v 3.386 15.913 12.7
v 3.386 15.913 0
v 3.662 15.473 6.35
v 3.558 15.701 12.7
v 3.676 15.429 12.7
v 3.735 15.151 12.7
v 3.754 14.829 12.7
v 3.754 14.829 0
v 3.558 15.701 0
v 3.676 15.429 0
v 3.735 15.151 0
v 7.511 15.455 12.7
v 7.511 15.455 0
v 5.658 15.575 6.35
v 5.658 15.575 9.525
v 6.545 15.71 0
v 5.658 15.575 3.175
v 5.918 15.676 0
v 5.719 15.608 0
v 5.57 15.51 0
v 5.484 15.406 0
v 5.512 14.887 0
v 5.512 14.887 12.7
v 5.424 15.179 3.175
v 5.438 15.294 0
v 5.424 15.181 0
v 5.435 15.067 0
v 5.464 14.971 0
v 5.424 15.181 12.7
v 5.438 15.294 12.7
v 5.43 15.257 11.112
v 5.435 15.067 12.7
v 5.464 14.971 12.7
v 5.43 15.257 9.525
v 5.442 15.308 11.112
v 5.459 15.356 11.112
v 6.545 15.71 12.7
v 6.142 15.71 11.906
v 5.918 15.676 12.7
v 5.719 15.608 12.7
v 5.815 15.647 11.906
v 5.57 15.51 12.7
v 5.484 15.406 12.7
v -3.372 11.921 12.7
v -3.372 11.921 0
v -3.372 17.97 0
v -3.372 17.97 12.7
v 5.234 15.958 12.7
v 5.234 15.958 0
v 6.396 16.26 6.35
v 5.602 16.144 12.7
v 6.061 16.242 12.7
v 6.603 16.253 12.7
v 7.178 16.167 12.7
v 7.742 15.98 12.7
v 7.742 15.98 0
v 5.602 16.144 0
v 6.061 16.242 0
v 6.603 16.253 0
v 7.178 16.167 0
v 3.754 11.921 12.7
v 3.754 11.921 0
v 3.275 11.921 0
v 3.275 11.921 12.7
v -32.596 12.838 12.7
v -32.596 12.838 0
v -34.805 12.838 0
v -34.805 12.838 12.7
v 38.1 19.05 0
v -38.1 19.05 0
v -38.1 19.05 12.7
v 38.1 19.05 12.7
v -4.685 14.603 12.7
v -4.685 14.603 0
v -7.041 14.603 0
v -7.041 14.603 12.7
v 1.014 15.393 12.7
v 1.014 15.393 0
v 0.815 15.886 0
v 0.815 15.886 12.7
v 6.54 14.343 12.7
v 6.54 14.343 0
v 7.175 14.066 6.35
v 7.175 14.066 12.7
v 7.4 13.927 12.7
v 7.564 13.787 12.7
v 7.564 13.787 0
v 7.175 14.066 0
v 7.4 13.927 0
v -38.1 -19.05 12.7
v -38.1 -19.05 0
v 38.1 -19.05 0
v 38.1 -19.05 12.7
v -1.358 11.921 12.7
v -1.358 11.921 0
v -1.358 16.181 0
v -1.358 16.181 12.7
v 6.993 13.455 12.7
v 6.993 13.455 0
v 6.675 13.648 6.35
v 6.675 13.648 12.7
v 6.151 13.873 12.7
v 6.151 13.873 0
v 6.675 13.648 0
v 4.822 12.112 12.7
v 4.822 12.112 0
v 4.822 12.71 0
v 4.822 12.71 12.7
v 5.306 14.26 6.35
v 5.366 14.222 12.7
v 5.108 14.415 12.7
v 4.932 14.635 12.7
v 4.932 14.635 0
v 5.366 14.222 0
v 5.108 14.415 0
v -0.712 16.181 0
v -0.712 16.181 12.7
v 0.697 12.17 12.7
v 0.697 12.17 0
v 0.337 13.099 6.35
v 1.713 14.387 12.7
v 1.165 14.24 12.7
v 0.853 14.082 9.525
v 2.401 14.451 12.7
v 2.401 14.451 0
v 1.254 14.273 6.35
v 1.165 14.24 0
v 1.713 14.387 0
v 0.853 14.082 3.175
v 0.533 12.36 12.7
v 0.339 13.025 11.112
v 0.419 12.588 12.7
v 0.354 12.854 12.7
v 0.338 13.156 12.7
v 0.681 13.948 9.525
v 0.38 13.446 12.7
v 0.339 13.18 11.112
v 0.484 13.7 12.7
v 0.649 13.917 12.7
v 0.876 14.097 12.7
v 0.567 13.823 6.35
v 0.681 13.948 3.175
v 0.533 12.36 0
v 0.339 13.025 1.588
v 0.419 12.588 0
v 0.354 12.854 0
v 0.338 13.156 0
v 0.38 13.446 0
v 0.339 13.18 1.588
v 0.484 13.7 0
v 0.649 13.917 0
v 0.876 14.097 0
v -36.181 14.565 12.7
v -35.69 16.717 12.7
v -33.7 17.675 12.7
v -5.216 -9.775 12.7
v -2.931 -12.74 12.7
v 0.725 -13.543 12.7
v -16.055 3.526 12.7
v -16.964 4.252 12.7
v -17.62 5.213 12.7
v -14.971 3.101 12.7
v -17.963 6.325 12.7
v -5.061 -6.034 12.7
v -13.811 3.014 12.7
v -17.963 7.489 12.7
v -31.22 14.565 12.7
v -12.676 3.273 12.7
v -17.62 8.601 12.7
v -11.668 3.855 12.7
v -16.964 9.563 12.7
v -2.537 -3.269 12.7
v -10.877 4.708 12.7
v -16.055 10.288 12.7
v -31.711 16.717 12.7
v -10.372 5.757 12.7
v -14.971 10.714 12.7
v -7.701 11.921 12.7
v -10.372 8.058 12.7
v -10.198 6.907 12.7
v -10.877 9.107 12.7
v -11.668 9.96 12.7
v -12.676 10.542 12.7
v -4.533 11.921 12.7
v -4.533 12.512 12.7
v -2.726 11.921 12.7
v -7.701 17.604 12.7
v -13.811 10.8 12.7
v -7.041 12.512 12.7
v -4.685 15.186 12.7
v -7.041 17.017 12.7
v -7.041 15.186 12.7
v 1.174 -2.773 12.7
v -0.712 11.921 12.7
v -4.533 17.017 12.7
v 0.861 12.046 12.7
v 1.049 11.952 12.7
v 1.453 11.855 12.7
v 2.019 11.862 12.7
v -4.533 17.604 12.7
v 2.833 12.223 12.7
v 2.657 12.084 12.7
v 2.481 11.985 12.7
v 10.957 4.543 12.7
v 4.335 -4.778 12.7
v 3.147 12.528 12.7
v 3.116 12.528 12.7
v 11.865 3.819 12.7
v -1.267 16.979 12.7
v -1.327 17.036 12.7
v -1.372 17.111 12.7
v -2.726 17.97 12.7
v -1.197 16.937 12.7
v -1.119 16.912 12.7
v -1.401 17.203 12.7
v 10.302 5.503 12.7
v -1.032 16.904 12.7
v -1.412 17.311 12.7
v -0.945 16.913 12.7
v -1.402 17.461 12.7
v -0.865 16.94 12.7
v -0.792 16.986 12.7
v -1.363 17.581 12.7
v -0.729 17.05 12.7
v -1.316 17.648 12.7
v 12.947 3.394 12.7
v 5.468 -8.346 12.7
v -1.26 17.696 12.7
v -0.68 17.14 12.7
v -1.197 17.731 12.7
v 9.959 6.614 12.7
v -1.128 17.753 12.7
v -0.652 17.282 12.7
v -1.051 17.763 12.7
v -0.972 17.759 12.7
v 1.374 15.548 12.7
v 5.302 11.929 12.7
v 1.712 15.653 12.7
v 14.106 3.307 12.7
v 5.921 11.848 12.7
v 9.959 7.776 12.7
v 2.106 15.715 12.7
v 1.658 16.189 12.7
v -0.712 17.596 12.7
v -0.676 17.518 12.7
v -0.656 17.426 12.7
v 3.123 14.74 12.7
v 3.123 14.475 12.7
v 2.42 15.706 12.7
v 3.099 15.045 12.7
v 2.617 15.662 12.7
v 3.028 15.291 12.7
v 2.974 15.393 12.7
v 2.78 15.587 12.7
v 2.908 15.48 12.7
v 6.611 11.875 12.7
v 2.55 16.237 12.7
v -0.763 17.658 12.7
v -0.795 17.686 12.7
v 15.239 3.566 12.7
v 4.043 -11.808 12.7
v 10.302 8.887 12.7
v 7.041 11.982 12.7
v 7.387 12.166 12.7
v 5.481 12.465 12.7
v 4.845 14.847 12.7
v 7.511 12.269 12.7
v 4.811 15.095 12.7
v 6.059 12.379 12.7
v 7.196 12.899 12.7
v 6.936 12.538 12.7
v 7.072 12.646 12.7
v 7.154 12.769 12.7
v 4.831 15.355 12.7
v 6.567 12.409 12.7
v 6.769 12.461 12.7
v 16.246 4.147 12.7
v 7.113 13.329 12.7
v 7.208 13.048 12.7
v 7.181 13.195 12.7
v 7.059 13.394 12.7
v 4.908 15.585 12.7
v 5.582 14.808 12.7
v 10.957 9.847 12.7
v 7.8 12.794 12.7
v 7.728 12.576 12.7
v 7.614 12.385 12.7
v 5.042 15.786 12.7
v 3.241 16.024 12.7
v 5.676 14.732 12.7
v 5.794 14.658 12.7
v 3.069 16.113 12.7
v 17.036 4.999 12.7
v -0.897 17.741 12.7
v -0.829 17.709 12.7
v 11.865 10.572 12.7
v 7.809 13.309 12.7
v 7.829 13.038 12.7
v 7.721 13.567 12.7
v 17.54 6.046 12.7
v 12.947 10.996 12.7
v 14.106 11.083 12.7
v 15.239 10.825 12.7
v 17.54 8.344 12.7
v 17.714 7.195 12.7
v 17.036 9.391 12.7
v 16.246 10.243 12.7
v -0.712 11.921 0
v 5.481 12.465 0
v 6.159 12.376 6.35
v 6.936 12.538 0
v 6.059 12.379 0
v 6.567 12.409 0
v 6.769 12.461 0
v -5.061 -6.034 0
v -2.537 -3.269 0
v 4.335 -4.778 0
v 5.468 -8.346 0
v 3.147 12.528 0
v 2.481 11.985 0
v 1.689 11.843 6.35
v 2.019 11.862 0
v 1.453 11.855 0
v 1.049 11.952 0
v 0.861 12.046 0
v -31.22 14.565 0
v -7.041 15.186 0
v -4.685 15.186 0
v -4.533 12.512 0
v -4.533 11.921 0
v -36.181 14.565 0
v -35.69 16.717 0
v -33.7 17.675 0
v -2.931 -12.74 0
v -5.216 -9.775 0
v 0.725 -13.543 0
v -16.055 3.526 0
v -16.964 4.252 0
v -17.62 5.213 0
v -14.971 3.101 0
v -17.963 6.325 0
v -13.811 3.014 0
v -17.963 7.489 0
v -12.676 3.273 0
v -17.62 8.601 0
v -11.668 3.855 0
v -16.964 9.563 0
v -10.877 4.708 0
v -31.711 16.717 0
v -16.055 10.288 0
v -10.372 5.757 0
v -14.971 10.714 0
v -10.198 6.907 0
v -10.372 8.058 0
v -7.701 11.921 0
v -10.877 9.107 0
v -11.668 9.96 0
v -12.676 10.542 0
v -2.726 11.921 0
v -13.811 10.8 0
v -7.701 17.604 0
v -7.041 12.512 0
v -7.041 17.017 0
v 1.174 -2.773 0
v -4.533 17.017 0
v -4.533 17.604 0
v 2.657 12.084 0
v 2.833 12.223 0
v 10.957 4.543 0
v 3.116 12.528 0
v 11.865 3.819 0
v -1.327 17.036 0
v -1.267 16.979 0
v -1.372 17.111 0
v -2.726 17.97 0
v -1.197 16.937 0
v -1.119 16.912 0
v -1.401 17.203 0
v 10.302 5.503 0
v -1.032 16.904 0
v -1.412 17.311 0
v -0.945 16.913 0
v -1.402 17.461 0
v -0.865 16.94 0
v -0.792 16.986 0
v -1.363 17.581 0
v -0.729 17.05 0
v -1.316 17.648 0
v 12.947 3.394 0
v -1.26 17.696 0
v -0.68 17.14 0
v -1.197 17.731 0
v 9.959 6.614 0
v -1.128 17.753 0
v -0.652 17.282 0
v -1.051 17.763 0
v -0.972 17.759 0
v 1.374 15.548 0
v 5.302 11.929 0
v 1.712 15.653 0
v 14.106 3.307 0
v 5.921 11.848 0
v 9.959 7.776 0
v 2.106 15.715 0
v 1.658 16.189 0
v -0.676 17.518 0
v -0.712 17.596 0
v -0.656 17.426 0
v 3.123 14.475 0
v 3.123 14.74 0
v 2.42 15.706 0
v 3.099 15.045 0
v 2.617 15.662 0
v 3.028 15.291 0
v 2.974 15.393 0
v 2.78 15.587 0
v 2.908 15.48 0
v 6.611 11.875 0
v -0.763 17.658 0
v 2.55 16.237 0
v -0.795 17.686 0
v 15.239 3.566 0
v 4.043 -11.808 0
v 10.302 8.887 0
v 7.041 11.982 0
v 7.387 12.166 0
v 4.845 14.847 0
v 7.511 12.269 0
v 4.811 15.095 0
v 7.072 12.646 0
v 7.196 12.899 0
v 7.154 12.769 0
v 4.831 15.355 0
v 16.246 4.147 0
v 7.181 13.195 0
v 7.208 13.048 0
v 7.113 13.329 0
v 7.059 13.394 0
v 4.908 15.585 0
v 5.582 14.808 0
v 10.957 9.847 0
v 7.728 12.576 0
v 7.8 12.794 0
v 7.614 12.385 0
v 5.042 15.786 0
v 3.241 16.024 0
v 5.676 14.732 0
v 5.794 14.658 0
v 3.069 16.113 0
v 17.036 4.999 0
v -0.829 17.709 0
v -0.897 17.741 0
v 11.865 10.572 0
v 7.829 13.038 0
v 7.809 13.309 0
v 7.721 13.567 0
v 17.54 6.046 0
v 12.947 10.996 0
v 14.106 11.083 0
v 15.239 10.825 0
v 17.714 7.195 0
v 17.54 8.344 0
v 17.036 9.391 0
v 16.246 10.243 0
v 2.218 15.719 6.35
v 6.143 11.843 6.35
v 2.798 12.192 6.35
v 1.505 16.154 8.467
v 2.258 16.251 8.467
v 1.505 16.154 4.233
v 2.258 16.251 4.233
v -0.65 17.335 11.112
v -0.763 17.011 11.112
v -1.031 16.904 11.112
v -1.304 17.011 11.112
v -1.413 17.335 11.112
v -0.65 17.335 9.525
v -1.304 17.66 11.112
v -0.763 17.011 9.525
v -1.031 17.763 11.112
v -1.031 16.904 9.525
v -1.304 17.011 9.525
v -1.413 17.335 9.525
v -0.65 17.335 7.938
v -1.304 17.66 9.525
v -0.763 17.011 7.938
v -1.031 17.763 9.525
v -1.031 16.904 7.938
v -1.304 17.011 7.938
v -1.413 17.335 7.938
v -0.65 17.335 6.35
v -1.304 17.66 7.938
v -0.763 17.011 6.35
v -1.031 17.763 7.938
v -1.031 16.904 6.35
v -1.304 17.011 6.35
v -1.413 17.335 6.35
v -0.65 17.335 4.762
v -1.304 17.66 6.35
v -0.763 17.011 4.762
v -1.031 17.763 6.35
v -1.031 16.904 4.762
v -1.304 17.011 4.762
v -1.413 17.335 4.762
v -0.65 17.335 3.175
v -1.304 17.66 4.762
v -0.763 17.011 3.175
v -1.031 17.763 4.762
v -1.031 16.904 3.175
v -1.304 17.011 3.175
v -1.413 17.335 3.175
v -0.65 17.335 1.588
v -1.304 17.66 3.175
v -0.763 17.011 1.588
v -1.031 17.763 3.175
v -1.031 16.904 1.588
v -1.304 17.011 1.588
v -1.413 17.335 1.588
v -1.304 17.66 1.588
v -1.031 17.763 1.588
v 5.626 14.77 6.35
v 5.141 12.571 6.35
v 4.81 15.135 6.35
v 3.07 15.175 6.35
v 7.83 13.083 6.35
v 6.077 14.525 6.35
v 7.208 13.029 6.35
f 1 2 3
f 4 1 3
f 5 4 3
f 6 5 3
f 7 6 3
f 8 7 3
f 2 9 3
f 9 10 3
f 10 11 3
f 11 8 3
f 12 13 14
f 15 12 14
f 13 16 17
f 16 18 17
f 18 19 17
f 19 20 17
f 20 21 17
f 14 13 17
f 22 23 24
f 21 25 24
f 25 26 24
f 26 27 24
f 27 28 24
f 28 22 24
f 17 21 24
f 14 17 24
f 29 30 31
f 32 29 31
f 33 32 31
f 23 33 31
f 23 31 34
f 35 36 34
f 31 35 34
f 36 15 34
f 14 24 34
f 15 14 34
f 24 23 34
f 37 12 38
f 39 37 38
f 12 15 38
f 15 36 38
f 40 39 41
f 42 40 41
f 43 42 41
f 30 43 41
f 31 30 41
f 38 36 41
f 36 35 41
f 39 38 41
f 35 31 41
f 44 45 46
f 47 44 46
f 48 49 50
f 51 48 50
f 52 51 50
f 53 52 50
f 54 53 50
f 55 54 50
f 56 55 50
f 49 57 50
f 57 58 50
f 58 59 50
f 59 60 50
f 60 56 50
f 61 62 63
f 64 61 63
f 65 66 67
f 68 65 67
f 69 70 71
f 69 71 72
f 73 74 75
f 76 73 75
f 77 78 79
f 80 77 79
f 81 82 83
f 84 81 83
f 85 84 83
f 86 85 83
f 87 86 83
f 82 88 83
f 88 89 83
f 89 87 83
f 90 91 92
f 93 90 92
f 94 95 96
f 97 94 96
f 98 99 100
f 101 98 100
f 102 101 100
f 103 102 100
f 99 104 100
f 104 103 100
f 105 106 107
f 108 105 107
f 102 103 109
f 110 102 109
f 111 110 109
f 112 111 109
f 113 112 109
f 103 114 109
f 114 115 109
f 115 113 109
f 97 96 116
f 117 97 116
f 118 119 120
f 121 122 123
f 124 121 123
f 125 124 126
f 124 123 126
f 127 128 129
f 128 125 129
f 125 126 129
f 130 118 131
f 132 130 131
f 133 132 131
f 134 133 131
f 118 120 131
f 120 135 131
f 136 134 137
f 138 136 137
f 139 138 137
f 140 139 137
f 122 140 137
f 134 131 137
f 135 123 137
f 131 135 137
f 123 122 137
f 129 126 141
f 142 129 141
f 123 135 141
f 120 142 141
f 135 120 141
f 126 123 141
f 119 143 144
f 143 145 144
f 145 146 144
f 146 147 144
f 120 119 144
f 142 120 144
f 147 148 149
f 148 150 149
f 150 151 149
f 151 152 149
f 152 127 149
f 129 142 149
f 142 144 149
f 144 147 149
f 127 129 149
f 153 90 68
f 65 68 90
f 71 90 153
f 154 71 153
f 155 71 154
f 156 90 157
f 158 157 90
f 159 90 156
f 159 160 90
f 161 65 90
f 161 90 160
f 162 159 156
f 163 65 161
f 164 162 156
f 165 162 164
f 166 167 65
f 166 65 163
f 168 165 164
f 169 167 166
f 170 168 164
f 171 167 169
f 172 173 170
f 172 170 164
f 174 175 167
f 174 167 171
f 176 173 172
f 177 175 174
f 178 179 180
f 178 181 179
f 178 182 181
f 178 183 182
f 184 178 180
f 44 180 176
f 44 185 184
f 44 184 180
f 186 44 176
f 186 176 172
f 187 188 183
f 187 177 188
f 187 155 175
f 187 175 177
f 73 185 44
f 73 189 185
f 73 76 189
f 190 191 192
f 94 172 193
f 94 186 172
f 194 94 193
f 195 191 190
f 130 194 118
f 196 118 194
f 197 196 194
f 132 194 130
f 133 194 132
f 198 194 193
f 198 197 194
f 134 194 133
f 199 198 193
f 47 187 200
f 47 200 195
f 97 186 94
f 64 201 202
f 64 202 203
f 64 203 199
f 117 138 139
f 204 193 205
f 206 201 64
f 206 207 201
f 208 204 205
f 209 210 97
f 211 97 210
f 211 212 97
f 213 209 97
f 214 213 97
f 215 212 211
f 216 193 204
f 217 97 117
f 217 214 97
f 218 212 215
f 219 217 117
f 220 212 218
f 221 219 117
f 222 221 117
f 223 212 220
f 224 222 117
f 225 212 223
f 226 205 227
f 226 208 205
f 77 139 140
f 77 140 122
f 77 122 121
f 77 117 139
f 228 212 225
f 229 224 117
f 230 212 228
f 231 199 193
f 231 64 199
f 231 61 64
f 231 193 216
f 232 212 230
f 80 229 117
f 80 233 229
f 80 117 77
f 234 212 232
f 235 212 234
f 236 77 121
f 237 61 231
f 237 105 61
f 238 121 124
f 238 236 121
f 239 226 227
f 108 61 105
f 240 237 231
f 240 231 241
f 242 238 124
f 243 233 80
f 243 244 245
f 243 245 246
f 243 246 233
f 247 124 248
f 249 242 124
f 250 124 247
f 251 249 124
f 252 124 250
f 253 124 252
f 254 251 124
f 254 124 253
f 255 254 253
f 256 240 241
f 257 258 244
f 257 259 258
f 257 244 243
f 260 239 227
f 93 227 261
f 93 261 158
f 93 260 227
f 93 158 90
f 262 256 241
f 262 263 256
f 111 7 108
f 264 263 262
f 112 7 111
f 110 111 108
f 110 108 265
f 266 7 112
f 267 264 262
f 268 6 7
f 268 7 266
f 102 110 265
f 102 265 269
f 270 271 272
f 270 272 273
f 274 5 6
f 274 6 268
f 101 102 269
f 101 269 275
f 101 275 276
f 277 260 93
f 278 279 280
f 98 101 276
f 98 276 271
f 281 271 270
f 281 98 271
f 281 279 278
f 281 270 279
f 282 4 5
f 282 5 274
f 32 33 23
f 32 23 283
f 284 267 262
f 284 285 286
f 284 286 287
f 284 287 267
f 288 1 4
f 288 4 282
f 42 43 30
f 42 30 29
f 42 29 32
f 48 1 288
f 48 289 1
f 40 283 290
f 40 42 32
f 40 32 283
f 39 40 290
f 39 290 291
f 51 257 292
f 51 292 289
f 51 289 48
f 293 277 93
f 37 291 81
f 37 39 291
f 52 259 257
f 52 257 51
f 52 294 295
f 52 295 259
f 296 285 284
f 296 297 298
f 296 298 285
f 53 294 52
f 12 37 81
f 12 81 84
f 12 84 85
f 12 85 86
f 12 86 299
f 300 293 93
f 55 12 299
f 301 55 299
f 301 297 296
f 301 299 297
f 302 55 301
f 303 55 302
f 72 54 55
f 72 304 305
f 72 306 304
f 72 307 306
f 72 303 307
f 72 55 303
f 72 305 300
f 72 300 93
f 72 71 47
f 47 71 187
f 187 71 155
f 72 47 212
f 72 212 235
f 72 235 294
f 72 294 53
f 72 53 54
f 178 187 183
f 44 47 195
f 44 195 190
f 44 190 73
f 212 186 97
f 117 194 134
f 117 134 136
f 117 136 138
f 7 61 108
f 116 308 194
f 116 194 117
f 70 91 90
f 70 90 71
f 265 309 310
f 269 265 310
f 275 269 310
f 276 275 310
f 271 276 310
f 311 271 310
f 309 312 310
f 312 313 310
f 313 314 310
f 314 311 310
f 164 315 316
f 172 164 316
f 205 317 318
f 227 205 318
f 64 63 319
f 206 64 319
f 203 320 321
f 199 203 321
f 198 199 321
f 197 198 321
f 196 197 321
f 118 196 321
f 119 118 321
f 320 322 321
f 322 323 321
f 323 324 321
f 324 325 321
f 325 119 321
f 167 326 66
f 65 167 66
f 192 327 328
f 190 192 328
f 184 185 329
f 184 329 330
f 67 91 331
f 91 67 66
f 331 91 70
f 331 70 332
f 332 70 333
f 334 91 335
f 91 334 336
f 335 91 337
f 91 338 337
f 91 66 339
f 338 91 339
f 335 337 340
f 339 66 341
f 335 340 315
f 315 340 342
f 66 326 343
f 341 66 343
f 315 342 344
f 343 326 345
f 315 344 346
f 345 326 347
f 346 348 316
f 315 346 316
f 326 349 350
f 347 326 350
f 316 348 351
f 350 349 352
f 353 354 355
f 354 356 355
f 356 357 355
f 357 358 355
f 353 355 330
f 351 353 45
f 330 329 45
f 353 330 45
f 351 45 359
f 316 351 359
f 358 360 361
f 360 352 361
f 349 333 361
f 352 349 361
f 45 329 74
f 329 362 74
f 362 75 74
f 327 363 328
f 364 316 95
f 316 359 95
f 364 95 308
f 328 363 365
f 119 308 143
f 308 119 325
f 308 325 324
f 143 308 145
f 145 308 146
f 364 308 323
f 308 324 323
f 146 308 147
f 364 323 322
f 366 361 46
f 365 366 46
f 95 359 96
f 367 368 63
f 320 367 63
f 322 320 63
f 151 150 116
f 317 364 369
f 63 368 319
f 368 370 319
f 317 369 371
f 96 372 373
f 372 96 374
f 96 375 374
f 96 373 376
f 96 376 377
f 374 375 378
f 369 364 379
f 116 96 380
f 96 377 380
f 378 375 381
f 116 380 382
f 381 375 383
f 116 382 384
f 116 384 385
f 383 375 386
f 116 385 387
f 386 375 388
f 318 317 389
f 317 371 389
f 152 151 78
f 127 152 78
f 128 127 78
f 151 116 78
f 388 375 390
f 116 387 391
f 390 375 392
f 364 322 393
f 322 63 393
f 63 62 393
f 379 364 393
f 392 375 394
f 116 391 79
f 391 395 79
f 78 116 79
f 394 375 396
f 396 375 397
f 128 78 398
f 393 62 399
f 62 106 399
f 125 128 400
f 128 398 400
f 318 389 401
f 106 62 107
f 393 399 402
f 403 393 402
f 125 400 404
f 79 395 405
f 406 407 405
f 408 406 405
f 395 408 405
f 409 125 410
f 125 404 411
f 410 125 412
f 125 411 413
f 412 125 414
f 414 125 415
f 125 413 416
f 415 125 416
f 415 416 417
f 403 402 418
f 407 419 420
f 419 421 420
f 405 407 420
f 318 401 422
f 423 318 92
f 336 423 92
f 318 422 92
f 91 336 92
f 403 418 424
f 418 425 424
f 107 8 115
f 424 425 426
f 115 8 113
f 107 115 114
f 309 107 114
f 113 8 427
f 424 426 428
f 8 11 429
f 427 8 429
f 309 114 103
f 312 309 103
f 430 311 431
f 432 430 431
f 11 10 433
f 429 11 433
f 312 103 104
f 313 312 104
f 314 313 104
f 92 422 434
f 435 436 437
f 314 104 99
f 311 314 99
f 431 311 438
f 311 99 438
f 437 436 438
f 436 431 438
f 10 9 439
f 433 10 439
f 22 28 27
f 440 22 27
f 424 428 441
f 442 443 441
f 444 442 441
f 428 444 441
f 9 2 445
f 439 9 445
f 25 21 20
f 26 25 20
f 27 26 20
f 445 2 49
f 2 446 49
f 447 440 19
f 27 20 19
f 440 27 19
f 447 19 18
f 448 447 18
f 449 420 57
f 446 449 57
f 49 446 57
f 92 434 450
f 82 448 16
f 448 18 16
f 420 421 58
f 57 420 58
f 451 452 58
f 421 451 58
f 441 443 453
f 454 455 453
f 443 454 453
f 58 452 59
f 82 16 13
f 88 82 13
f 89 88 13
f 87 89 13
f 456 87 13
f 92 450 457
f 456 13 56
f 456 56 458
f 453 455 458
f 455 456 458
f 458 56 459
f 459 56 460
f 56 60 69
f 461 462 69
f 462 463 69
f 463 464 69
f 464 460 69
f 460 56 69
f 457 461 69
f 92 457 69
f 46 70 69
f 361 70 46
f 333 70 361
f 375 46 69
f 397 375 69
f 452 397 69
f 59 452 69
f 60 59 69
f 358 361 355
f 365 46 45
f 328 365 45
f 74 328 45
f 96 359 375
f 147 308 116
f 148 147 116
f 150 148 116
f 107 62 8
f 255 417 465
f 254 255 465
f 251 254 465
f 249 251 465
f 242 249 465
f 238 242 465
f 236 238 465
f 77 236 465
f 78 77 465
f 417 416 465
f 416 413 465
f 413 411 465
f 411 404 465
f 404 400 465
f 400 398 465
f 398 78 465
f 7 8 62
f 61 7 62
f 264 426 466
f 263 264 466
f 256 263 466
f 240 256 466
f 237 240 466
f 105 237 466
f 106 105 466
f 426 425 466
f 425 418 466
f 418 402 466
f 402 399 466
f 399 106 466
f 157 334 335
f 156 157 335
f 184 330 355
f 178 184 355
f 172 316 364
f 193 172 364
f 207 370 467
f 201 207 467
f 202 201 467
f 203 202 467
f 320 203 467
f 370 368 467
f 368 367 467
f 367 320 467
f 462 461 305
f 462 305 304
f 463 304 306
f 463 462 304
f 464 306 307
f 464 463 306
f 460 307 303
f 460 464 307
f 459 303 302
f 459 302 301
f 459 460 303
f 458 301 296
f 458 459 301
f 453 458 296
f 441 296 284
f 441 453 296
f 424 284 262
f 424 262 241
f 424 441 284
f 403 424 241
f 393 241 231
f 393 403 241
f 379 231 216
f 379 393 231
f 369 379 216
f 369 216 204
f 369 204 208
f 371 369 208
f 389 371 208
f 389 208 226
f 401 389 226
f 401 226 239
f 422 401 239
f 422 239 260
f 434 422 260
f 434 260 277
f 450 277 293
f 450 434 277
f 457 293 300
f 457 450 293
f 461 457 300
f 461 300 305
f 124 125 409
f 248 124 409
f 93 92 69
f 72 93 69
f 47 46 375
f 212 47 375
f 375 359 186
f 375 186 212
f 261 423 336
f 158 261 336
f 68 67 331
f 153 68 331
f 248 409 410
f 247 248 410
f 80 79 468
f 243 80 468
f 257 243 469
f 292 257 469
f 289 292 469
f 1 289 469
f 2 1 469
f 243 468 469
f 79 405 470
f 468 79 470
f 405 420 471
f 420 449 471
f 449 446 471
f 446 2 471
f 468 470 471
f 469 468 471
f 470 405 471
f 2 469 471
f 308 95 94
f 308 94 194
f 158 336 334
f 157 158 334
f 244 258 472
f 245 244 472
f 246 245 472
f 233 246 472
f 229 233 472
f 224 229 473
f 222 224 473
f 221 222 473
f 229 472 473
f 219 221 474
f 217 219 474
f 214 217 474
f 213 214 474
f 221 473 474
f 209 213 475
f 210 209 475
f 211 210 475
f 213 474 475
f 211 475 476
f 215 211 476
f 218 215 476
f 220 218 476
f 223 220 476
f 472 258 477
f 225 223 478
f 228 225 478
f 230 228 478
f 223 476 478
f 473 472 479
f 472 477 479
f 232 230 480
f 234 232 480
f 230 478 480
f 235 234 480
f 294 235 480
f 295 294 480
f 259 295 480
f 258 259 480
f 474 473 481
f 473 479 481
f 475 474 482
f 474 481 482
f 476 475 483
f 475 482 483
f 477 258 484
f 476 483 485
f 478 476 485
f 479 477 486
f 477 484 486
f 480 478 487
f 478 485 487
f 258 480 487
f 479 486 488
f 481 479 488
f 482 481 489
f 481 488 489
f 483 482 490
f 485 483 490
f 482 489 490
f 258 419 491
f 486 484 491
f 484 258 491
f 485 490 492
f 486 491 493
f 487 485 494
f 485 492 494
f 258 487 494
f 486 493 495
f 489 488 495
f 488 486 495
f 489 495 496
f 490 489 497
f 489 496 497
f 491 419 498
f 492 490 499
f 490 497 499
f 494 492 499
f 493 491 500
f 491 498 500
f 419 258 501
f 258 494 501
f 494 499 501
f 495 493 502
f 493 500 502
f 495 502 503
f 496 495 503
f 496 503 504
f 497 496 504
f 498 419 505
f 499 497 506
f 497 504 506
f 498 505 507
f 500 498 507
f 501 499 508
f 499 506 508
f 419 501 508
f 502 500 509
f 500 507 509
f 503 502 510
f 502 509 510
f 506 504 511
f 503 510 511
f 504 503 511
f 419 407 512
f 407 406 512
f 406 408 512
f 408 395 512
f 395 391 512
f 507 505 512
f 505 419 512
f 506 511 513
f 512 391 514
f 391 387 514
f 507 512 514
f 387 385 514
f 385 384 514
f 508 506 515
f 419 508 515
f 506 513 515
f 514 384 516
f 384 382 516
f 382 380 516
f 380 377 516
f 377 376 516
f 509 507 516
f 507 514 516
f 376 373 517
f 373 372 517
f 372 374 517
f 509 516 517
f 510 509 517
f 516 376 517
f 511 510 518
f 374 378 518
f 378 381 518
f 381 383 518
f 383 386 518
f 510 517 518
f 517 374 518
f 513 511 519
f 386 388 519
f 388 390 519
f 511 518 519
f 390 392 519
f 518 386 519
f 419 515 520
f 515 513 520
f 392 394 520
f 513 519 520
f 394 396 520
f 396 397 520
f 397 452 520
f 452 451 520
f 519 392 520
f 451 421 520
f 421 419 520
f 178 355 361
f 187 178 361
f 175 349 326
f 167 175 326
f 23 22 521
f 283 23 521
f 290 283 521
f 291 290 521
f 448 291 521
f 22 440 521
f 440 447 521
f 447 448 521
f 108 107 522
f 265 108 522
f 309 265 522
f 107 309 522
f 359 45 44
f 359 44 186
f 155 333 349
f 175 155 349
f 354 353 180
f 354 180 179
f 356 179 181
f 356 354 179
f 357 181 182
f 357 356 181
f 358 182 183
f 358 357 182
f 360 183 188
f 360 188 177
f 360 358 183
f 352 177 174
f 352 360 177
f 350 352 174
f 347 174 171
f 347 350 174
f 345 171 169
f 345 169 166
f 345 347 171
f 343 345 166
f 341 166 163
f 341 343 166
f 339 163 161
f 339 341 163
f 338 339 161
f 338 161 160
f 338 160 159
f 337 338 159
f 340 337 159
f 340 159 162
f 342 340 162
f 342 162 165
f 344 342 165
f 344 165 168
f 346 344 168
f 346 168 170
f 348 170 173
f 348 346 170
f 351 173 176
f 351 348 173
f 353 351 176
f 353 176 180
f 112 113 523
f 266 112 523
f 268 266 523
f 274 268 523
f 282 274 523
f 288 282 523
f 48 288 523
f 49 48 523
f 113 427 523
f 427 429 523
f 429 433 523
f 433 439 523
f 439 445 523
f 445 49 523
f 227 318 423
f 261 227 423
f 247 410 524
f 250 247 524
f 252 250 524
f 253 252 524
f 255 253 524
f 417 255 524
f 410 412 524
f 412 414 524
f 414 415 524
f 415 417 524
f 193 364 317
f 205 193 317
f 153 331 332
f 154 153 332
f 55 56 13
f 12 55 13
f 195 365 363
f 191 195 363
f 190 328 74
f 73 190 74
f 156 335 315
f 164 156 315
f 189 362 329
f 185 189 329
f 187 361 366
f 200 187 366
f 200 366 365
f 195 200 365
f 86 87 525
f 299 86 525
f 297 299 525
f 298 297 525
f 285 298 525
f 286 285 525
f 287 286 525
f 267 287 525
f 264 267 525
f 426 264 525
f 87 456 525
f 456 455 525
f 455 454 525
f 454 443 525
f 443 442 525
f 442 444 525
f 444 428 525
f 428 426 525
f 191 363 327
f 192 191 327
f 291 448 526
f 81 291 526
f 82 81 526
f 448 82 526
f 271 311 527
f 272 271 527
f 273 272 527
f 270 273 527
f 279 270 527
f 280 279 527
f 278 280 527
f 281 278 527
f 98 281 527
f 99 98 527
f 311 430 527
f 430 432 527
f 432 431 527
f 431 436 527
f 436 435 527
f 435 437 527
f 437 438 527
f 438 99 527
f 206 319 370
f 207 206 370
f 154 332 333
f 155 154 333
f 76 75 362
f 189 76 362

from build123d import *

# Parameters (mm, degrees)
F0_W     = 76.2
F0_H     = 38.1
F0_R     = 3.9040723684
F0_W_2   = 0.6455261652
F0_H_2   = 4.2599751749
F0_H_3   = 6.0485428542
F0_R_2   = 3.8989
F1_DEPTH = 12.7


with BuildPart() as f1:
    # F0 (on Top) → F1 (new body)
    with BuildSketch(Plane.XY):
        Rectangle(F0_W, F0_H)
        Polygon((5.4683112539, -8.3463666961), (4.0425748882, -11.8080461533), (0.725272804, -13.5434007948), (-2.9313924856, -12.7404388974), (-5.2164266525, -9.774875257), (-5.0606368145, -6.0343300593), (-2.5369187683, -3.269045974), (1.1738517643, -2.7729301572), (4.3353640105, -4.7781207134), align=None, mode=Mode.SUBTRACT)
        with Locations((-14.1024813056, 6.9073382765)):
            Circle(F0_R, mode=Mode.SUBTRACT)
        Polygon((-31.2197456793, 14.5646184978), (-32.5964540855, 12.8382807598), (-34.8045229299, 12.8382807598), (-36.1812313362, 14.5646184978), (-35.6898897947, 16.7173264462), (-33.7004885077, 17.6753716126), (-31.7110872208, 16.7173264462), align=None, mode=Mode.SUBTRACT)
        with Locations((-1.035253305, 14.0512490247)):
            Rectangle(F0_W_2, F0_H_2, mode=Mode.SUBTRACT)
        Polygon((-4.533408102, 12.5120609141), (-4.533408102, 11.9212614372), (-7.7013370861, 11.9212614372), (-7.7013370861, 17.60413051), (-4.533408102, 17.60413051), (-4.533408102, 17.0170623983), (-7.0408854604, 17.0170623983), (-7.0408854604, 15.1862059144), (-4.6851502834, 15.1862059144), (-4.6851502834, 14.6028691678), (-7.0408854604, 14.6028691678), (-7.0408854604, 12.5120609141), align=None, mode=Mode.SUBTRACT)
        with Locations((-3.0489466797, 14.9455328644)):
            Rectangle(F0_W_2, F0_H_3, mode=Mode.SUBTRACT)
        with BuildLine():
            add(Edge.make_bspline(
                [(-1.3039115934, 17.0108434565), (-1.412743076, 17.1178092565), (-1.412743076, 17.3354722216)],
                knots=[0, 0, 0, 1, 1, 1], degree=2))
            add(Edge.make_bspline(
                [(-1.412743076, 17.3354722216), (-1.412743076, 17.5568665519), (-1.3039115934, 17.6601009868)],
                knots=[0, 0, 0, 1, 1, 1], degree=2))
            add(Edge.make_bspline(
                [(-1.3039115934, 17.6601009868), (-1.1950801108, 17.7633354217), (-1.0309000457, 17.7633354217)],
                knots=[0, 0, 0, 1, 1, 1], degree=2))
            add(Edge.make_bspline(
                [(-1.0309000457, 17.7633354217), (-0.8754264992, 17.7633354217), (-0.7628636515, 17.6582353042)],
                knots=[0, 0, 0, 1, 1, 1], degree=2))
            add(Edge.make_bspline(
                [(-0.7628636515, 17.6582353042), (-0.6503008038, 17.5531351868), (-0.6503008038, 17.3354722216)],
                knots=[0, 0, 0, 1, 1, 1], degree=2))
            add(Edge.make_bspline(
                [(-0.6503008038, 17.3354722216), (-0.6503008038, 17.1178092565), (-0.7628636515, 17.0108434565)],
                knots=[0, 0, 0, 1, 1, 1], degree=2))
            add(Edge.make_bspline(
                [(-0.7628636515, 17.0108434565), (-0.8754264992, 16.9038776565), (-1.0309000457, 16.9038776565)],
                knots=[0, 0, 0, 1, 1, 1], degree=2))
            add(Edge.make_bspline(
                [(-1.0309000457, 16.9038776565), (-1.1950801108, 16.9038776565), (-1.3039115934, 17.0108434565)],
                knots=[0, 0, 0, 1, 1, 1], degree=2))
        make_face(mode=Mode.SUBTRACT)
        with Locations((13.814676553, 7.1951444261)):
            Circle(F0_R_2, mode=Mode.SUBTRACT)
        with BuildLine():
            Line((3.7539538223, 11.9212614372), (3.275095299, 11.9212614372))
            Line((3.275095299, 11.9212614372), (3.1469850967, 12.5282301629))
            Line((3.1469850967, 12.5282301629), (3.1158903874, 12.5282301629))
            add(Edge.make_bspline(
                [(3.1158903874, 12.5282301629), (2.7974805641, 12.127730307), (2.4809364233, 11.9853165384)],
                knots=[0, 0, 0, 1, 1, 1], degree=2))
            add(Edge.make_bspline(
                [(2.4809364233, 11.9853165384), (2.1643922826, 11.8429027698), (1.6892651244, 11.8429027698)],
                knots=[0, 0, 0, 1, 1, 1], degree=2))
            add(Edge.make_bspline(
                [(1.6892651244, 11.8429027698), (1.0561768429, 11.8429027698), (0.6967220033, 12.1700191117)],
                knots=[0, 0, 0, 1, 1, 1], degree=2))
            add(Edge.make_bspline(
                [(0.6967220033, 12.1700191117), (0.3372671638, 12.4971354536), (0.3372671638, 13.0991290258)],
                knots=[0, 0, 0, 1, 1, 1], degree=2))
            add(Edge.make_bspline(
                [(0.3372671638, 13.0991290258), (0.3372671638, 14.3889375678), (2.4007120733, 14.4511269864)],
                knots=[0, 0, 0, 1, 1, 1], degree=2))
            Line((2.4007120733, 14.4511269864), (3.1233531176, 14.4747589655))
            Line((3.1233531176, 14.4747589655), (3.1233531176, 14.7396858887))
            add(Edge.make_bspline(
                [(3.1233531176, 14.7396858887), (3.1233531176, 15.2409326028), (2.9081777292, 15.4797399702)],
                knots=[0, 0, 0, 1, 1, 1], degree=2))
            add(Edge.make_bspline(
                [(2.9081777292, 15.4797399702), (2.6930023408, 15.7185473377), (2.2178751826, 15.7185473377)],
                knots=[0, 0, 0, 1, 1, 1], degree=2))
            add(Edge.make_bspline(
                [(2.2178751826, 15.7185473377), (1.6855337593, 15.7185473377), (1.0138880383, 15.3926747842)],
                knots=[0, 0, 0, 1, 1, 1], degree=2))
            Line((1.0138880383, 15.3926747842), (0.8148818987, 15.886458768))
            add(Edge.make_bspline(
                [(0.8148818987, 15.886458768), (1.1295603569, 16.056857775), (1.5045625511, 16.153873268)],
                knots=[0, 0, 0, 1, 1, 1], degree=2))
            add(Edge.make_bspline(
                [(1.5045625511, 16.153873268), (1.8795647453, 16.250888761), (2.2576764105, 16.250888761)],
                knots=[0, 0, 0, 1, 1, 1], degree=2))
            add(Edge.make_bspline(
                [(2.2576764105, 16.250888761), (3.0188748943, 16.250888761), (3.3864143583, 15.913200218)],
                knots=[0, 0, 0, 1, 1, 1], degree=2))
            add(Edge.make_bspline(
                [(3.3864143583, 15.913200218), (3.7539538223, 15.5755116749), (3.7539538223, 14.8292386515)],
                knots=[0, 0, 0, 1, 1, 1], degree=2))
            Line((3.7539538223, 14.8292386515), (3.7539538223, 11.9212614372))
        make_face(mode=Mode.SUBTRACT)
        with BuildLine():
            add(Edge.make_bspline(
                [(7.5636776065, 13.7869439956), (7.8298483182, 13.5070916119), (7.8298483182, 13.0829597769)],
                knots=[0, 0, 0, 1, 1, 1], degree=2))
            add(Edge.make_bspline(
                [(7.8298483182, 13.0829597769), (7.8298483182, 12.488428935), (7.3870596577, 12.1656658524)],
                knots=[0, 0, 0, 1, 1, 1], degree=2))
            add(Edge.make_bspline(
                [(7.3870596577, 12.1656658524), (6.9442709971, 11.8429027698), (6.1432712854, 11.8429027698)],
                knots=[0, 0, 0, 1, 1, 1], degree=2))
            add(Edge.make_bspline(
                [(6.1432712854, 11.8429027698), (5.2962514039, 11.8429027698), (4.8223680341, 12.1115610582)],
                knots=[0, 0, 0, 1, 1, 1], degree=2))
            Line((4.8223680341, 12.1115610582), (4.8223680341, 12.7098232652))
            add(Edge.make_bspline(
                [(4.8223680341, 12.7098232652), (5.129583762, 12.5543497187), (5.4809539772, 12.4654188501)],
                knots=[0, 0, 0, 1, 1, 1], degree=2))
            add(Edge.make_bspline(
                [(5.4809539772, 12.4654188501), (5.8323241923, 12.3764879815), (6.1594405342, 12.3764879815)],
                knots=[0, 0, 0, 1, 1, 1], degree=2))
            add(Edge.make_bspline(
                [(6.1594405342, 12.3764879815), (6.6644186134, 12.3764879815), (6.9361863727, 12.5375585757)],
                knots=[0, 0, 0, 1, 1, 1], degree=2))
            add(Edge.make_bspline(
                [(6.9361863727, 12.5375585757), (7.2079541321, 12.6986291699), (7.2079541321, 13.0294768769)],
                knots=[0, 0, 0, 1, 1, 1], degree=2))
            add(Edge.make_bspline(
                [(7.2079541321, 13.0294768769), (7.2079541321, 13.2782345514), (6.9927787437, 13.4548525002)],
                knots=[0, 0, 0, 1, 1, 1], degree=2))
            add(Edge.make_bspline(
                [(6.9927787437, 13.4548525002), (6.7776033553, 13.6314704491), (6.1507340156, 13.8727653933)],
                knots=[0, 0, 0, 1, 1, 1], degree=2))
            add(Edge.make_bspline(
                [(6.1507340156, 13.8727653933), (5.5562031737, 14.0941597236), (5.3055798167, 14.2595835771)],
                knots=[0, 0, 0, 1, 1, 1], degree=2))
            add(Edge.make_bspline(
                [(5.3055798167, 14.2595835771), (5.0549564597, 14.4250074306), (4.932443305, 14.6345857713)],
                knots=[0, 0, 0, 1, 1, 1], degree=2))
            add(Edge.make_bspline(
                [(4.932443305, 14.6345857713), (4.8099301504, 14.844164112), (4.8099301504, 15.1352105911)],
                knots=[0, 0, 0, 1, 1, 1], degree=2))
            add(Edge.make_bspline(
                [(4.8099301504, 15.1352105911), (4.8099301504, 15.6563579191), (5.2340619853, 15.9579765994)],
                knots=[0, 0, 0, 1, 1, 1], degree=2))
            add(Edge.make_bspline(
                [(5.2340619853, 15.9579765994), (5.6581938202, 16.2595952796), (6.395760325, 16.2595952796)],
                knots=[0, 0, 0, 1, 1, 1], degree=2))
            add(Edge.make_bspline(
                [(6.395760325, 16.2595952796), (7.0835752948, 16.2595952796), (7.7415393437, 15.9797428959)],
                knots=[0, 0, 0, 1, 1, 1], degree=2))
            Line((7.7415393437, 15.9797428959), (7.5114384949, 15.4548642028))
            add(Edge.make_bspline(
                [(7.5114384949, 15.4548642028), (6.8708874832, 15.7185473377), (6.3497401552, 15.7185473377)],
                knots=[0, 0, 0, 1, 1, 1], degree=2))
            add(Edge.make_bspline(
                [(6.3497401552, 15.7185473377), (5.8907822458, 15.7185473377), (5.657571926, 15.5748897807)],
                knots=[0, 0, 0, 1, 1, 1], degree=2))
            add(Edge.make_bspline(
                [(5.657571926, 15.5748897807), (5.4243616062, 15.4312322237), (5.4243616062, 15.1787431842)],
                knots=[0, 0, 0, 1, 1, 1], degree=2))
            add(Edge.make_bspline(
                [(5.4243616062, 15.1787431842), (5.4243616062, 15.0071003888), (5.5120486865, 14.8870748109)],
                knots=[0, 0, 0, 1, 1, 1], degree=2))
            add(Edge.make_bspline(
                [(5.5120486865, 14.8870748109), (5.5997357667, 14.7670492329), (5.7937667528, 14.6582177504)],
                knots=[0, 0, 0, 1, 1, 1], degree=2))
            add(Edge.make_bspline(
                [(5.7937667528, 14.6582177504), (5.9877977389, 14.5493862678), (6.5400397762, 14.342917398)],
                knots=[0, 0, 0, 1, 1, 1], degree=2))
            add(Edge.make_bspline(
                [(6.5400397762, 14.342917398), (7.2975068949, 14.0667963794), (7.5636776065, 13.7869439956)],
                knots=[0, 0, 0, 1, 1, 1], degree=2))
        make_face(mode=Mode.SUBTRACT)
    extrude(amount=F1_DEPTH)


solid = f1.part
